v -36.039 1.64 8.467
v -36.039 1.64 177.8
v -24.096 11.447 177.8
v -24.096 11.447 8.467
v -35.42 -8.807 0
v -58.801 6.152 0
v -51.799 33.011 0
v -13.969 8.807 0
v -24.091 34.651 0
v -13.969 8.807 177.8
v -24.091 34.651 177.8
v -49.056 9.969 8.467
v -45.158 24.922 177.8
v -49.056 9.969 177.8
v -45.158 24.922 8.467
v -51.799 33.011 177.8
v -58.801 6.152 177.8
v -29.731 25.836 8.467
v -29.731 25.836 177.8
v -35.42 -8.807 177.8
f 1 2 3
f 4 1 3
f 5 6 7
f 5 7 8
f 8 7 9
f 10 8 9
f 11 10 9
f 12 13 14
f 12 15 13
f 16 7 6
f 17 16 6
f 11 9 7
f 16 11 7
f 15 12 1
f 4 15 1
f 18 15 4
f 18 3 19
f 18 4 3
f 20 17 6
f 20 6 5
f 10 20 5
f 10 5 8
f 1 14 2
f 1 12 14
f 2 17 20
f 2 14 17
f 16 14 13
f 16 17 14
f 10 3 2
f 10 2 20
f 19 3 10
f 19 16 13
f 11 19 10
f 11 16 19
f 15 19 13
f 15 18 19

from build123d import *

# Parameters (mm, degrees)
F1_DEPTH = 177.8
F2_T     = -8.4666666667


# Not quite as in the source:
# - a length typed as a fraction of an inch, garbled in the dataset ("3 / 203.2 mm" for 3/8 in), is restored


with BuildPart() as f1:
    # F0 (on Top) → F1 (new body)
    with BuildSketch(Plane.XY):
        Polygon((-35.4204343678, -8.8066042373), (-13.96876778, 8.8066042373), (-24.0909949393, 34.6511322751), (-51.7985419534, 33.0107205511), (-58.8005205937, 6.1523623123), align=None)
    extrude(amount=F1_DEPTH)

    # F2
    f2_openings = [f1.faces().sort_by_distance(p)[0] for p in [
        (-36.815852, 14.762843, 177.8),
    ]]
    offset(amount=F2_T, openings=f2_openings)


solid = f1.part
